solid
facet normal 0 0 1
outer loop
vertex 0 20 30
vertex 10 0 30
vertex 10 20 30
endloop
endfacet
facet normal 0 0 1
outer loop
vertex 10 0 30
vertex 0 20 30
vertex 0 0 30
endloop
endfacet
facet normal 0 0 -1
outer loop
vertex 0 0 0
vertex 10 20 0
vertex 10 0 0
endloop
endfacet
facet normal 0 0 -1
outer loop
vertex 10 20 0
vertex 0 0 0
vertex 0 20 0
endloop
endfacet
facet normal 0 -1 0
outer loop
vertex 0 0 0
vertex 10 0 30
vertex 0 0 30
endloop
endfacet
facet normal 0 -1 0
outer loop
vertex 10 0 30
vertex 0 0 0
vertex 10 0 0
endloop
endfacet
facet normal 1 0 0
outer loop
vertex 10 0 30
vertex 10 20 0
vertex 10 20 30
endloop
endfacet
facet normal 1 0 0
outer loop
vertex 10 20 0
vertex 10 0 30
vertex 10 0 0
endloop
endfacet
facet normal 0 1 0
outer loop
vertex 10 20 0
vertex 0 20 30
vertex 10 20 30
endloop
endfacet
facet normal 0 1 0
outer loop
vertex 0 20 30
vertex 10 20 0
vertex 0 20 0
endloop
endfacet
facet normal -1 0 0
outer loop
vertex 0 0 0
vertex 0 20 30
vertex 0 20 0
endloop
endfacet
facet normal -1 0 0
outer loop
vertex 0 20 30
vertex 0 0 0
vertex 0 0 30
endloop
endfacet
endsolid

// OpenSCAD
// Smoke geometry. Separates environment failures from model failures.
cube([10, 20, 30]);
